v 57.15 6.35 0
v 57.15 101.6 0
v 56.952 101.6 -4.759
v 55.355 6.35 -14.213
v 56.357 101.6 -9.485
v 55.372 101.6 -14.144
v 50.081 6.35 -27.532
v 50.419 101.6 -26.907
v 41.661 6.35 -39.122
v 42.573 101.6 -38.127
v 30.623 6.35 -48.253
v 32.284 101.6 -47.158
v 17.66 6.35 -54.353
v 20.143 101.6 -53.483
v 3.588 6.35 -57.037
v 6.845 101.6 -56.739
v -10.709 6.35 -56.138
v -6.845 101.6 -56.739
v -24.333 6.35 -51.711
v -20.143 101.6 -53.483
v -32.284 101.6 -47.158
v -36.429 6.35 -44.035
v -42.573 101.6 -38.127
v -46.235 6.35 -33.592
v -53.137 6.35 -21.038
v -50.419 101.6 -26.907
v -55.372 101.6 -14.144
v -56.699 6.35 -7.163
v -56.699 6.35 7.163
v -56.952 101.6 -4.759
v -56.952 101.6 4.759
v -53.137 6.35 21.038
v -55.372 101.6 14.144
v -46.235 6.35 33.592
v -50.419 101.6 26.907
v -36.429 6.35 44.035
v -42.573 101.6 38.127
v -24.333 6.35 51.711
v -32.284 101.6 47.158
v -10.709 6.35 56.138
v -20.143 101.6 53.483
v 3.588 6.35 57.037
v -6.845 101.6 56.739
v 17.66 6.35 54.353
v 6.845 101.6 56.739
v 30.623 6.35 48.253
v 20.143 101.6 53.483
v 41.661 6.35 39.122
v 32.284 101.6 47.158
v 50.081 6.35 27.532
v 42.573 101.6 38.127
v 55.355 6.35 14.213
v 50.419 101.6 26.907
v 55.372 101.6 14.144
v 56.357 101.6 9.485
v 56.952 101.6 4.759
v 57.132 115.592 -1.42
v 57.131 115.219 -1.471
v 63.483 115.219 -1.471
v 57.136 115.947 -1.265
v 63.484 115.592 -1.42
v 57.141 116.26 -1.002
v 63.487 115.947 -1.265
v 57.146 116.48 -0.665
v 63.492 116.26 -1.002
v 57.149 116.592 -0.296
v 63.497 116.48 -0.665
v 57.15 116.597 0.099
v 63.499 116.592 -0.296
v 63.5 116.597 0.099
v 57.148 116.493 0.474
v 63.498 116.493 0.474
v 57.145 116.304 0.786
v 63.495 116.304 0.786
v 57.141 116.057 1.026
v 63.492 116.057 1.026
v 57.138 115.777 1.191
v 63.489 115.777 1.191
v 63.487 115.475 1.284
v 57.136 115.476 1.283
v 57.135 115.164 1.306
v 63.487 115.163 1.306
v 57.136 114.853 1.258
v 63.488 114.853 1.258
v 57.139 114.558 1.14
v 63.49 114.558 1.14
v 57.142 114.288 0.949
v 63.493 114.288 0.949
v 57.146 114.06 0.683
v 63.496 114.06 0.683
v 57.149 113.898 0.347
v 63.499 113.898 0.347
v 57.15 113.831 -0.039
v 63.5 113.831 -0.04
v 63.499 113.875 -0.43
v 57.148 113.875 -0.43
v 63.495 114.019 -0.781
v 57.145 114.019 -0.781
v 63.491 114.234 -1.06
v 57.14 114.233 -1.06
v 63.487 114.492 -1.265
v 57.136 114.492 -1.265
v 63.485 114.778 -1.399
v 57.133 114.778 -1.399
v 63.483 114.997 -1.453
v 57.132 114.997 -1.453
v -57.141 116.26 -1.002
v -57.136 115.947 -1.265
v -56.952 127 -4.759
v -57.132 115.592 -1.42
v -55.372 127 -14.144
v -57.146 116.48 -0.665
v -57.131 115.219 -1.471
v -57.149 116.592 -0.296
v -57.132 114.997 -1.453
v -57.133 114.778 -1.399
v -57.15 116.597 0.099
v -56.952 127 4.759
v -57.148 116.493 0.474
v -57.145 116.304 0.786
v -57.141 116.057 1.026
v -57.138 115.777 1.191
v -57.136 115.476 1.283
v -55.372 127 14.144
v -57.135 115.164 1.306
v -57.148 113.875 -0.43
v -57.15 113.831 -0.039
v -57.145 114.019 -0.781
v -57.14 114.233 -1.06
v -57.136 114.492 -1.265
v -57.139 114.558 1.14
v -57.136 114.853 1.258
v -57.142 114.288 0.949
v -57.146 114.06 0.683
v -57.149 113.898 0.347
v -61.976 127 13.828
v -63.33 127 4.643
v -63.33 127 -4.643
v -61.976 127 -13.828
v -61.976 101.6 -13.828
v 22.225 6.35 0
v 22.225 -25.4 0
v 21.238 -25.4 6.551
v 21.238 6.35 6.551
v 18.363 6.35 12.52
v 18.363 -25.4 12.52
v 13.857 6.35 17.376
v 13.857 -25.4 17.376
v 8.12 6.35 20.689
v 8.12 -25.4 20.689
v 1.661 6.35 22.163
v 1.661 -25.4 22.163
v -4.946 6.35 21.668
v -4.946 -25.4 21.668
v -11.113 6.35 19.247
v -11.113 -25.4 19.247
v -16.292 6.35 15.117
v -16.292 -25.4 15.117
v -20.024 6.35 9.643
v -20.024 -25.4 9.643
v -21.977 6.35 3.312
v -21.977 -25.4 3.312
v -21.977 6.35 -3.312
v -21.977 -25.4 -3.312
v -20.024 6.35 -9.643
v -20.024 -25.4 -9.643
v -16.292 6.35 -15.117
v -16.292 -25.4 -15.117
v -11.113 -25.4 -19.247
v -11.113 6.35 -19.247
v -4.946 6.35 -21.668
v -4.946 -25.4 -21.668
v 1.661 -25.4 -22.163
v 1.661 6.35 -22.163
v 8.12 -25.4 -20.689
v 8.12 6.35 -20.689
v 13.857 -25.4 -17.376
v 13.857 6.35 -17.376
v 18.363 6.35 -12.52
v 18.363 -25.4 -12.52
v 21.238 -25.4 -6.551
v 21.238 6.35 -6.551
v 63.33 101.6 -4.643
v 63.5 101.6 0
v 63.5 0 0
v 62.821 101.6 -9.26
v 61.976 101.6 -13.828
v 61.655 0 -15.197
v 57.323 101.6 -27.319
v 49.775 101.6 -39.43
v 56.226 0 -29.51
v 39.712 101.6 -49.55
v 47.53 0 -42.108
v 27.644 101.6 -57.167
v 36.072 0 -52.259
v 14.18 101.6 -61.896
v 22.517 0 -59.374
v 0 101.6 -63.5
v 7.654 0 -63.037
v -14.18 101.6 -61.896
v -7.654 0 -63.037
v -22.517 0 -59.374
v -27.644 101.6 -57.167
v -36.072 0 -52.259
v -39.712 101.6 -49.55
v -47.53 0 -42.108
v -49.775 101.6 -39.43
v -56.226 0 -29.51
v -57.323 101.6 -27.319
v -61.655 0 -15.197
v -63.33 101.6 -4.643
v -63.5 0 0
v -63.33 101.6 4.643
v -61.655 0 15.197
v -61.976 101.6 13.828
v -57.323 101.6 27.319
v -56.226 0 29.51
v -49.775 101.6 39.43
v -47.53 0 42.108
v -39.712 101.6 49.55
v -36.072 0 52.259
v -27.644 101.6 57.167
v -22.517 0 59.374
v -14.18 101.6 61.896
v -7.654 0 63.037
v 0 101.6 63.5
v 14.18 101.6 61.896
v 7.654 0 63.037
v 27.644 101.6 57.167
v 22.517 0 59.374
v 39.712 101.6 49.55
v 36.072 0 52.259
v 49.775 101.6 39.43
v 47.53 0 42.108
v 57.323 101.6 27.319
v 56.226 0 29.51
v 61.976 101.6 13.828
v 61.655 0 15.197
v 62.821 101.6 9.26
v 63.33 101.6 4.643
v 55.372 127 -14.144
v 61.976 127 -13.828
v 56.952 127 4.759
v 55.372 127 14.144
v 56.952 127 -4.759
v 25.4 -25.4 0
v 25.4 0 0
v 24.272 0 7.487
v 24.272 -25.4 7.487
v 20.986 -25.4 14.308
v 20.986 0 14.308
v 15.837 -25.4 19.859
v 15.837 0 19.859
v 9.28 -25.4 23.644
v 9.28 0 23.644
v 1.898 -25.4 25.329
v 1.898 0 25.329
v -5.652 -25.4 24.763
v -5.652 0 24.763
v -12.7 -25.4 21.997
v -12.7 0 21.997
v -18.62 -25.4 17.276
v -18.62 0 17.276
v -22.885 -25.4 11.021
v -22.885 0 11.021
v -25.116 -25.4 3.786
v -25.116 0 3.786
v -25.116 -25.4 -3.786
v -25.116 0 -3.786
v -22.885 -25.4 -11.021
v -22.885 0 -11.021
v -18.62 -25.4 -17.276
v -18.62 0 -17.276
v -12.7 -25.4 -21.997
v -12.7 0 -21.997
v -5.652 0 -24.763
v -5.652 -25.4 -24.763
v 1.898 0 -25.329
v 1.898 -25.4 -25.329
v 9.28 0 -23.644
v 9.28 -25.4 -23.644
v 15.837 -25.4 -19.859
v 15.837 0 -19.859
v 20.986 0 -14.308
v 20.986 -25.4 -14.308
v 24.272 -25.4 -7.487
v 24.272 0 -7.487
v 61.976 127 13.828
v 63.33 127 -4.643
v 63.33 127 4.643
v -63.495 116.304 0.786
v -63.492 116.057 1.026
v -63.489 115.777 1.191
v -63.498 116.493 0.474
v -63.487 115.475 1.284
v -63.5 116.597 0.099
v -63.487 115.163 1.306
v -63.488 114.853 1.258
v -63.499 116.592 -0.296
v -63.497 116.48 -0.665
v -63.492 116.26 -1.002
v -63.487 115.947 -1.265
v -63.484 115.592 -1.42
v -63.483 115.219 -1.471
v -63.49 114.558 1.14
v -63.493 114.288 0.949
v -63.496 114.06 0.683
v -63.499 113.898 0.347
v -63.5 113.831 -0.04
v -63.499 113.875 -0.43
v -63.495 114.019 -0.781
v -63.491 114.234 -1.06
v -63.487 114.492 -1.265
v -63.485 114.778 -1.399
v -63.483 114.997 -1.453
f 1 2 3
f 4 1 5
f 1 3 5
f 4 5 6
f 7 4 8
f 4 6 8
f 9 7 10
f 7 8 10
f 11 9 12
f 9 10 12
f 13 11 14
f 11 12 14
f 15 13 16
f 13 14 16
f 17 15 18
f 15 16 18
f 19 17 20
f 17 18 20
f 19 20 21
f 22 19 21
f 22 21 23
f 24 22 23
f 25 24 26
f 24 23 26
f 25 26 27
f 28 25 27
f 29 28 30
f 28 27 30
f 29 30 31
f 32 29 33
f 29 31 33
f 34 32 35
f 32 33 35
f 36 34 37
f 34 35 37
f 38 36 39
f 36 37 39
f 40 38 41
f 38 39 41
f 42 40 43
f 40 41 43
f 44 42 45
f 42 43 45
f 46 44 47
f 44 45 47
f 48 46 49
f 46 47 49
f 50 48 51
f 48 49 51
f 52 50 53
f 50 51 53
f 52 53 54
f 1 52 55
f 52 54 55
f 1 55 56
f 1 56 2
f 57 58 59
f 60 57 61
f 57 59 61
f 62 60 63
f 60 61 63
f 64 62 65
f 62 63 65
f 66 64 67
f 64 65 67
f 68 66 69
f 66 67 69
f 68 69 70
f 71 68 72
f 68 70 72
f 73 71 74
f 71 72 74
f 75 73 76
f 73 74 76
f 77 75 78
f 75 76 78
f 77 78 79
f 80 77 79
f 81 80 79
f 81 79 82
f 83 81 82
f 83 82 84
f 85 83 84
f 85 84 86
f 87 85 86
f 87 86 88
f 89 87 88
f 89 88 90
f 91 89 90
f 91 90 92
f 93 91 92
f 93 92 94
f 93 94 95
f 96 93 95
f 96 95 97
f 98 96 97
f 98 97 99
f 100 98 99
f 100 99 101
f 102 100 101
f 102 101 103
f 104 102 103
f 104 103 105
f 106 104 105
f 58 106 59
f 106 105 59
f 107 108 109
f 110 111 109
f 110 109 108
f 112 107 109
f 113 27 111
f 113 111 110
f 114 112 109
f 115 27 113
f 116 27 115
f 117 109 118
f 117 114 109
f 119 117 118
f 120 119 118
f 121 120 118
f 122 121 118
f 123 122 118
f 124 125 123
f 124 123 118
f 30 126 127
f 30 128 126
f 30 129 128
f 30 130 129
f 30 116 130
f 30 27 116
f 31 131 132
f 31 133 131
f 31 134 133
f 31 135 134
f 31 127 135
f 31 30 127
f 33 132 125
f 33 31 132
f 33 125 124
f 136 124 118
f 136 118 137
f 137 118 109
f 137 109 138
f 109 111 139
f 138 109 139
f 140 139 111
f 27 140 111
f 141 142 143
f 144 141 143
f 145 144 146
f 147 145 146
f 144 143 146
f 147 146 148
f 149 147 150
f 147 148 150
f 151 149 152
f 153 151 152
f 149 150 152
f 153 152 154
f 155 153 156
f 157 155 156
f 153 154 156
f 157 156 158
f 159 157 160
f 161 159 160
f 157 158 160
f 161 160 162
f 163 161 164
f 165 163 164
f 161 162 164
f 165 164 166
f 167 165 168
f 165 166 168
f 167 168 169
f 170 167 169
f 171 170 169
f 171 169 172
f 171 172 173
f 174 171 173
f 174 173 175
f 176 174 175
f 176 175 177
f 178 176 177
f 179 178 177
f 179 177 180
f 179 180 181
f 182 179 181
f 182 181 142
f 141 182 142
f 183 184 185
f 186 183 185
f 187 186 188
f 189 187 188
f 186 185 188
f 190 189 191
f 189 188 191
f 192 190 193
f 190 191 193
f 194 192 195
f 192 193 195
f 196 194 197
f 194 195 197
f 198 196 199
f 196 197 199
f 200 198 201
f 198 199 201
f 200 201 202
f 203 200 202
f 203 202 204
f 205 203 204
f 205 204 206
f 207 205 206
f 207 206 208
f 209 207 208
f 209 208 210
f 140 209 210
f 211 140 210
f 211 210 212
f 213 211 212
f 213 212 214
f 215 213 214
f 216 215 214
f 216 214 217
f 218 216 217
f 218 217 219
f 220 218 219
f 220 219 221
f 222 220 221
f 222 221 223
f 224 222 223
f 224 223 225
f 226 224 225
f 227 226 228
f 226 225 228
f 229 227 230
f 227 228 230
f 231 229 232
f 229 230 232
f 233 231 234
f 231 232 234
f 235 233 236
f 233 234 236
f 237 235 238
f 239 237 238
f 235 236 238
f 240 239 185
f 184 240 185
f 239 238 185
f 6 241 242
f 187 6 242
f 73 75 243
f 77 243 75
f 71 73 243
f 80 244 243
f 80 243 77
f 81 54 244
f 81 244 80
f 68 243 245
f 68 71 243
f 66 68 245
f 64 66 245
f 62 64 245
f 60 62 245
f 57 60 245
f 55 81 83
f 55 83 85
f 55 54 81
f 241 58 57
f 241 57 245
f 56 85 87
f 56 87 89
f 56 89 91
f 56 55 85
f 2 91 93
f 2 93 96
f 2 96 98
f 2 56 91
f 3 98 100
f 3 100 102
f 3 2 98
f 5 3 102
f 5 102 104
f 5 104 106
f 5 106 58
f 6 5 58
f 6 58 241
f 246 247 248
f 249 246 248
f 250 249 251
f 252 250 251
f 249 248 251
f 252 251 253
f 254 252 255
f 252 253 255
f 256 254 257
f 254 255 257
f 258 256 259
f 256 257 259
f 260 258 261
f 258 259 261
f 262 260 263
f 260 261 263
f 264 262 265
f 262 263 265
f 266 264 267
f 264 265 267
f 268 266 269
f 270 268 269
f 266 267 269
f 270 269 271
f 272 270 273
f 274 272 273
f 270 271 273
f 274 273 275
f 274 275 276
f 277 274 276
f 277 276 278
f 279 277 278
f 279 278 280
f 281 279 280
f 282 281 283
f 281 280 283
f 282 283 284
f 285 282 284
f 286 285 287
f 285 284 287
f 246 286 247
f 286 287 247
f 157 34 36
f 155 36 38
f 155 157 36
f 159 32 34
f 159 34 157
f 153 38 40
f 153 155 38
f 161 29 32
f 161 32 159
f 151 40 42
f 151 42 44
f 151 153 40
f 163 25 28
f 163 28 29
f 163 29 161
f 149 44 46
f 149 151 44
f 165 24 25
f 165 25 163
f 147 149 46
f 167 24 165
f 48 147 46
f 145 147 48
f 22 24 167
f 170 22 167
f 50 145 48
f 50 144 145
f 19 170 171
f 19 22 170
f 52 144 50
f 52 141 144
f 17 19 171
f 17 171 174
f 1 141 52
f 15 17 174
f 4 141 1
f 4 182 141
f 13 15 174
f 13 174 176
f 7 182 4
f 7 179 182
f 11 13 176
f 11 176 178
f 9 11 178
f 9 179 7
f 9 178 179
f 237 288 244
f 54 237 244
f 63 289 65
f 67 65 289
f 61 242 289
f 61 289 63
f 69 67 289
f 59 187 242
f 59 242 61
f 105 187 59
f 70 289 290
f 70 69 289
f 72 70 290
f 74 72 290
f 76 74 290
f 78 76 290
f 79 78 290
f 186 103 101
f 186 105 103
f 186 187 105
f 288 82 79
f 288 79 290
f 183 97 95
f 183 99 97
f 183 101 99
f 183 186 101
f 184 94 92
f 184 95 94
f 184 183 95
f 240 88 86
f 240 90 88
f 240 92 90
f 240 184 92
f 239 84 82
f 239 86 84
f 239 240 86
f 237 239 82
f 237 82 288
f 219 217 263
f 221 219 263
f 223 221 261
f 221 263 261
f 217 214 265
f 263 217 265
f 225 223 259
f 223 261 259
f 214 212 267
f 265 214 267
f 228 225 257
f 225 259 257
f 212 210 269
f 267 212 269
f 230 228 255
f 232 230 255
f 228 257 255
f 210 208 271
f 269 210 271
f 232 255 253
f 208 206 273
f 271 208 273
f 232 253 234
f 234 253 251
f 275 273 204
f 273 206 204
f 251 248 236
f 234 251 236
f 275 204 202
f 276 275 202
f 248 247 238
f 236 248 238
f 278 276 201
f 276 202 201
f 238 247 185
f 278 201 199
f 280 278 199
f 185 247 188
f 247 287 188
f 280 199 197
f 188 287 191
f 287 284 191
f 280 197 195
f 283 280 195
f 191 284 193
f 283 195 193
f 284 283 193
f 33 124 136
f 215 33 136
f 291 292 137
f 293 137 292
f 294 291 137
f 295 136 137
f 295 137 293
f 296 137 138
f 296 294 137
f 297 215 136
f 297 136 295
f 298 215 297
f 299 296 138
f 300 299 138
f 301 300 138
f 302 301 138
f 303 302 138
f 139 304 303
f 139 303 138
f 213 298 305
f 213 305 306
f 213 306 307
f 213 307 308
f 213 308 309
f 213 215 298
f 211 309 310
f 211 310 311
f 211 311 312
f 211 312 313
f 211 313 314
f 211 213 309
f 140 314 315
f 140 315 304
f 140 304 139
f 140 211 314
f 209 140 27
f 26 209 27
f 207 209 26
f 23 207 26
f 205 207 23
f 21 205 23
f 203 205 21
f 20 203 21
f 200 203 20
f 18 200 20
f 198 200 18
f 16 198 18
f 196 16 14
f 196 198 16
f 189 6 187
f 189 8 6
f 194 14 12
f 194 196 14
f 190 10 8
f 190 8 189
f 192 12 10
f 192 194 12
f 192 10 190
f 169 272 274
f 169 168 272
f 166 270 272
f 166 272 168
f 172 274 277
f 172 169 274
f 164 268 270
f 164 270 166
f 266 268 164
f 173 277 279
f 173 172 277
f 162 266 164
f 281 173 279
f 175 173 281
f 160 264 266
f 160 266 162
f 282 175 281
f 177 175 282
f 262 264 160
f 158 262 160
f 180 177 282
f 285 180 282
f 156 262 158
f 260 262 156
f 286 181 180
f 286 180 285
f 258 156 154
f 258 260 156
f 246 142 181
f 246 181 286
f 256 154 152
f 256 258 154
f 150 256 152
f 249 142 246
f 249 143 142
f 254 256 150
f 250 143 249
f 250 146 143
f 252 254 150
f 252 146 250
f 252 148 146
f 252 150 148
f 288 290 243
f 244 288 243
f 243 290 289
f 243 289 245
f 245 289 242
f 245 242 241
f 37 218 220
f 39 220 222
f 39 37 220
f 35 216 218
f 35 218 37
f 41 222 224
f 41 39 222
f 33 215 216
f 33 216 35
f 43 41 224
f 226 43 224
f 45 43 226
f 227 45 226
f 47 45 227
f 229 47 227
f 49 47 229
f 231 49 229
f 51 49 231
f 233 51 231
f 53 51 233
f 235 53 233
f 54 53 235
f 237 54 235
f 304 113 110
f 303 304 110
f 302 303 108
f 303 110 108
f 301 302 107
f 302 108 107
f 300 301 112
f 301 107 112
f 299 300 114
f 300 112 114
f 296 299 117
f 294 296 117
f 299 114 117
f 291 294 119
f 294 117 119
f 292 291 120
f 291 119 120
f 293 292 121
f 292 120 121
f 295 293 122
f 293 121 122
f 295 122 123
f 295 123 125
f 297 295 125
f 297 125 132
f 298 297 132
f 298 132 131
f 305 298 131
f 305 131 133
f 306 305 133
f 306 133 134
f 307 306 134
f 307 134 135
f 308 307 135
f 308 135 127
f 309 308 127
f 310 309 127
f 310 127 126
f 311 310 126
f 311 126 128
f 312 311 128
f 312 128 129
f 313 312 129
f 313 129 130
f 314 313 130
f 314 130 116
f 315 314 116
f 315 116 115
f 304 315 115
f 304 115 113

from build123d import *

# Parameters (mm, degrees)
SKETCH1_R           = 63.5
BOSS_EXTRUDE1_DEPTH = 76.2
SKETCH2_R           = 57.15
CUT_EXTRUDE1_DEPTH  = 69.85
SKETCH4_R           = 25.4
BOSS_EXTRUDE2_DEPTH = 25.4
SKETCH5_R           = 22.225
CUT_EXTRUDE2_DEPTH  = 2514.6
SKETCH8_R           = 63.5
BOSS_EXTRUDE3_DEPTH = 25.4
SKETCH9_R           = 57.15
CUT_EXTRUDE3_DEPTH  = 50.8
BOSS_EXTRUDE5_DEPTH = 25.4
BOSS_EXTRUDE6_DEPTH = 25.4
SKETCH14_R          = 1.389063
CUT_EXTRUDE4_DEPTH  = 2514.6


with BuildPart() as part:
    # Sketch1 → Boss-Extrude1 (new body)
    with BuildSketch(Plane(origin=(0, 0, 0), x_dir=(1, 0, 0), z_dir=(0, 1, 0))):
        Circle(SKETCH1_R)
    extrude(amount=BOSS_EXTRUDE1_DEPTH)

    # Sketch2 → Cut-Extrude1 (cut)
    with BuildSketch(Plane(origin=(0, 76.2, 0), x_dir=(1, 0, 0), z_dir=(0, 1, 0))):
        Circle(SKETCH2_R)
    extrude(amount=-CUT_EXTRUDE1_DEPTH, mode=Mode.SUBTRACT)

    # Sketch4 → Boss-Extrude2 (add)
    with BuildSketch(Plane.XZ):
        Circle(SKETCH4_R)
    extrude(amount=BOSS_EXTRUDE2_DEPTH)

    # Sketch5 → Cut-Extrude2 (cut)
    with BuildSketch(Plane.XZ.offset(25.4)):
        Circle(SKETCH5_R)
    extrude(amount=-CUT_EXTRUDE2_DEPTH, mode=Mode.SUBTRACT)

    # Sketch8 → Boss-Extrude3 (add)
    with BuildSketch(Plane(origin=(0, 76.2, 0), x_dir=(1, 0, 0), z_dir=(0, 1, 0))):
        Circle(SKETCH8_R)
    extrude(amount=BOSS_EXTRUDE3_DEPTH)

    # Sketch9 → Cut-Extrude3 (cut)
    with BuildSketch(Plane(origin=(0, 101.6, 0), x_dir=(1, 0, 0), z_dir=(0, 1, 0))):
        Circle(SKETCH9_R)
    extrude(amount=-CUT_EXTRUDE3_DEPTH, mode=Mode.SUBTRACT)

    # Sketch11 → Boss-Extrude5 (add)
    with BuildSketch(Plane(origin=(0, 101.6, 0), x_dir=(1, 0, 0), z_dir=(0, 1, 0))):
        with BuildLine():
            Line((-61.976, 13.828428), (-55.372, 14.144402))
            ThreePointArc((-55.372, 14.144402), (-57.15, 0), (-55.372, -14.144402))
            Line((-55.372, -14.144402), (-61.976, -13.828428))
            ThreePointArc((-61.976, -13.828428), (-63.5, 0), (-61.976, 13.828428))
        make_face()
    extrude(amount=BOSS_EXTRUDE5_DEPTH)

    # Sketch13 → Boss-Extrude6 (add)
    with BuildSketch(Plane(origin=(0, 101.6, 0), x_dir=(1, 0, 0), z_dir=(0, 1, 0))):
        with BuildLine():
            Line((55.372, 14.144402), (61.976, 13.828428))
            ThreePointArc((61.976, 13.828428), (63.5, 0), (61.976, -13.828428))
            Line((61.976, -13.828428), (55.372, -14.144402))
            ThreePointArc((55.372, -14.144402), (57.15, 0), (55.372, 14.144402))
        make_face()
    extrude(amount=BOSS_EXTRUDE6_DEPTH)

    # Sketch14 → Cut-Extrude4 (cut)
    with BuildSketch(Plane(origin=(101.6, 0, 0), x_dir=(0, 0, -1), z_dir=(1, 0, 0))):
        with Locations((0.081717, 115.219319)):
            Circle(SKETCH14_R)
    extrude(amount=-CUT_EXTRUDE4_DEPTH, mode=Mode.SUBTRACT)


solid = part.part
